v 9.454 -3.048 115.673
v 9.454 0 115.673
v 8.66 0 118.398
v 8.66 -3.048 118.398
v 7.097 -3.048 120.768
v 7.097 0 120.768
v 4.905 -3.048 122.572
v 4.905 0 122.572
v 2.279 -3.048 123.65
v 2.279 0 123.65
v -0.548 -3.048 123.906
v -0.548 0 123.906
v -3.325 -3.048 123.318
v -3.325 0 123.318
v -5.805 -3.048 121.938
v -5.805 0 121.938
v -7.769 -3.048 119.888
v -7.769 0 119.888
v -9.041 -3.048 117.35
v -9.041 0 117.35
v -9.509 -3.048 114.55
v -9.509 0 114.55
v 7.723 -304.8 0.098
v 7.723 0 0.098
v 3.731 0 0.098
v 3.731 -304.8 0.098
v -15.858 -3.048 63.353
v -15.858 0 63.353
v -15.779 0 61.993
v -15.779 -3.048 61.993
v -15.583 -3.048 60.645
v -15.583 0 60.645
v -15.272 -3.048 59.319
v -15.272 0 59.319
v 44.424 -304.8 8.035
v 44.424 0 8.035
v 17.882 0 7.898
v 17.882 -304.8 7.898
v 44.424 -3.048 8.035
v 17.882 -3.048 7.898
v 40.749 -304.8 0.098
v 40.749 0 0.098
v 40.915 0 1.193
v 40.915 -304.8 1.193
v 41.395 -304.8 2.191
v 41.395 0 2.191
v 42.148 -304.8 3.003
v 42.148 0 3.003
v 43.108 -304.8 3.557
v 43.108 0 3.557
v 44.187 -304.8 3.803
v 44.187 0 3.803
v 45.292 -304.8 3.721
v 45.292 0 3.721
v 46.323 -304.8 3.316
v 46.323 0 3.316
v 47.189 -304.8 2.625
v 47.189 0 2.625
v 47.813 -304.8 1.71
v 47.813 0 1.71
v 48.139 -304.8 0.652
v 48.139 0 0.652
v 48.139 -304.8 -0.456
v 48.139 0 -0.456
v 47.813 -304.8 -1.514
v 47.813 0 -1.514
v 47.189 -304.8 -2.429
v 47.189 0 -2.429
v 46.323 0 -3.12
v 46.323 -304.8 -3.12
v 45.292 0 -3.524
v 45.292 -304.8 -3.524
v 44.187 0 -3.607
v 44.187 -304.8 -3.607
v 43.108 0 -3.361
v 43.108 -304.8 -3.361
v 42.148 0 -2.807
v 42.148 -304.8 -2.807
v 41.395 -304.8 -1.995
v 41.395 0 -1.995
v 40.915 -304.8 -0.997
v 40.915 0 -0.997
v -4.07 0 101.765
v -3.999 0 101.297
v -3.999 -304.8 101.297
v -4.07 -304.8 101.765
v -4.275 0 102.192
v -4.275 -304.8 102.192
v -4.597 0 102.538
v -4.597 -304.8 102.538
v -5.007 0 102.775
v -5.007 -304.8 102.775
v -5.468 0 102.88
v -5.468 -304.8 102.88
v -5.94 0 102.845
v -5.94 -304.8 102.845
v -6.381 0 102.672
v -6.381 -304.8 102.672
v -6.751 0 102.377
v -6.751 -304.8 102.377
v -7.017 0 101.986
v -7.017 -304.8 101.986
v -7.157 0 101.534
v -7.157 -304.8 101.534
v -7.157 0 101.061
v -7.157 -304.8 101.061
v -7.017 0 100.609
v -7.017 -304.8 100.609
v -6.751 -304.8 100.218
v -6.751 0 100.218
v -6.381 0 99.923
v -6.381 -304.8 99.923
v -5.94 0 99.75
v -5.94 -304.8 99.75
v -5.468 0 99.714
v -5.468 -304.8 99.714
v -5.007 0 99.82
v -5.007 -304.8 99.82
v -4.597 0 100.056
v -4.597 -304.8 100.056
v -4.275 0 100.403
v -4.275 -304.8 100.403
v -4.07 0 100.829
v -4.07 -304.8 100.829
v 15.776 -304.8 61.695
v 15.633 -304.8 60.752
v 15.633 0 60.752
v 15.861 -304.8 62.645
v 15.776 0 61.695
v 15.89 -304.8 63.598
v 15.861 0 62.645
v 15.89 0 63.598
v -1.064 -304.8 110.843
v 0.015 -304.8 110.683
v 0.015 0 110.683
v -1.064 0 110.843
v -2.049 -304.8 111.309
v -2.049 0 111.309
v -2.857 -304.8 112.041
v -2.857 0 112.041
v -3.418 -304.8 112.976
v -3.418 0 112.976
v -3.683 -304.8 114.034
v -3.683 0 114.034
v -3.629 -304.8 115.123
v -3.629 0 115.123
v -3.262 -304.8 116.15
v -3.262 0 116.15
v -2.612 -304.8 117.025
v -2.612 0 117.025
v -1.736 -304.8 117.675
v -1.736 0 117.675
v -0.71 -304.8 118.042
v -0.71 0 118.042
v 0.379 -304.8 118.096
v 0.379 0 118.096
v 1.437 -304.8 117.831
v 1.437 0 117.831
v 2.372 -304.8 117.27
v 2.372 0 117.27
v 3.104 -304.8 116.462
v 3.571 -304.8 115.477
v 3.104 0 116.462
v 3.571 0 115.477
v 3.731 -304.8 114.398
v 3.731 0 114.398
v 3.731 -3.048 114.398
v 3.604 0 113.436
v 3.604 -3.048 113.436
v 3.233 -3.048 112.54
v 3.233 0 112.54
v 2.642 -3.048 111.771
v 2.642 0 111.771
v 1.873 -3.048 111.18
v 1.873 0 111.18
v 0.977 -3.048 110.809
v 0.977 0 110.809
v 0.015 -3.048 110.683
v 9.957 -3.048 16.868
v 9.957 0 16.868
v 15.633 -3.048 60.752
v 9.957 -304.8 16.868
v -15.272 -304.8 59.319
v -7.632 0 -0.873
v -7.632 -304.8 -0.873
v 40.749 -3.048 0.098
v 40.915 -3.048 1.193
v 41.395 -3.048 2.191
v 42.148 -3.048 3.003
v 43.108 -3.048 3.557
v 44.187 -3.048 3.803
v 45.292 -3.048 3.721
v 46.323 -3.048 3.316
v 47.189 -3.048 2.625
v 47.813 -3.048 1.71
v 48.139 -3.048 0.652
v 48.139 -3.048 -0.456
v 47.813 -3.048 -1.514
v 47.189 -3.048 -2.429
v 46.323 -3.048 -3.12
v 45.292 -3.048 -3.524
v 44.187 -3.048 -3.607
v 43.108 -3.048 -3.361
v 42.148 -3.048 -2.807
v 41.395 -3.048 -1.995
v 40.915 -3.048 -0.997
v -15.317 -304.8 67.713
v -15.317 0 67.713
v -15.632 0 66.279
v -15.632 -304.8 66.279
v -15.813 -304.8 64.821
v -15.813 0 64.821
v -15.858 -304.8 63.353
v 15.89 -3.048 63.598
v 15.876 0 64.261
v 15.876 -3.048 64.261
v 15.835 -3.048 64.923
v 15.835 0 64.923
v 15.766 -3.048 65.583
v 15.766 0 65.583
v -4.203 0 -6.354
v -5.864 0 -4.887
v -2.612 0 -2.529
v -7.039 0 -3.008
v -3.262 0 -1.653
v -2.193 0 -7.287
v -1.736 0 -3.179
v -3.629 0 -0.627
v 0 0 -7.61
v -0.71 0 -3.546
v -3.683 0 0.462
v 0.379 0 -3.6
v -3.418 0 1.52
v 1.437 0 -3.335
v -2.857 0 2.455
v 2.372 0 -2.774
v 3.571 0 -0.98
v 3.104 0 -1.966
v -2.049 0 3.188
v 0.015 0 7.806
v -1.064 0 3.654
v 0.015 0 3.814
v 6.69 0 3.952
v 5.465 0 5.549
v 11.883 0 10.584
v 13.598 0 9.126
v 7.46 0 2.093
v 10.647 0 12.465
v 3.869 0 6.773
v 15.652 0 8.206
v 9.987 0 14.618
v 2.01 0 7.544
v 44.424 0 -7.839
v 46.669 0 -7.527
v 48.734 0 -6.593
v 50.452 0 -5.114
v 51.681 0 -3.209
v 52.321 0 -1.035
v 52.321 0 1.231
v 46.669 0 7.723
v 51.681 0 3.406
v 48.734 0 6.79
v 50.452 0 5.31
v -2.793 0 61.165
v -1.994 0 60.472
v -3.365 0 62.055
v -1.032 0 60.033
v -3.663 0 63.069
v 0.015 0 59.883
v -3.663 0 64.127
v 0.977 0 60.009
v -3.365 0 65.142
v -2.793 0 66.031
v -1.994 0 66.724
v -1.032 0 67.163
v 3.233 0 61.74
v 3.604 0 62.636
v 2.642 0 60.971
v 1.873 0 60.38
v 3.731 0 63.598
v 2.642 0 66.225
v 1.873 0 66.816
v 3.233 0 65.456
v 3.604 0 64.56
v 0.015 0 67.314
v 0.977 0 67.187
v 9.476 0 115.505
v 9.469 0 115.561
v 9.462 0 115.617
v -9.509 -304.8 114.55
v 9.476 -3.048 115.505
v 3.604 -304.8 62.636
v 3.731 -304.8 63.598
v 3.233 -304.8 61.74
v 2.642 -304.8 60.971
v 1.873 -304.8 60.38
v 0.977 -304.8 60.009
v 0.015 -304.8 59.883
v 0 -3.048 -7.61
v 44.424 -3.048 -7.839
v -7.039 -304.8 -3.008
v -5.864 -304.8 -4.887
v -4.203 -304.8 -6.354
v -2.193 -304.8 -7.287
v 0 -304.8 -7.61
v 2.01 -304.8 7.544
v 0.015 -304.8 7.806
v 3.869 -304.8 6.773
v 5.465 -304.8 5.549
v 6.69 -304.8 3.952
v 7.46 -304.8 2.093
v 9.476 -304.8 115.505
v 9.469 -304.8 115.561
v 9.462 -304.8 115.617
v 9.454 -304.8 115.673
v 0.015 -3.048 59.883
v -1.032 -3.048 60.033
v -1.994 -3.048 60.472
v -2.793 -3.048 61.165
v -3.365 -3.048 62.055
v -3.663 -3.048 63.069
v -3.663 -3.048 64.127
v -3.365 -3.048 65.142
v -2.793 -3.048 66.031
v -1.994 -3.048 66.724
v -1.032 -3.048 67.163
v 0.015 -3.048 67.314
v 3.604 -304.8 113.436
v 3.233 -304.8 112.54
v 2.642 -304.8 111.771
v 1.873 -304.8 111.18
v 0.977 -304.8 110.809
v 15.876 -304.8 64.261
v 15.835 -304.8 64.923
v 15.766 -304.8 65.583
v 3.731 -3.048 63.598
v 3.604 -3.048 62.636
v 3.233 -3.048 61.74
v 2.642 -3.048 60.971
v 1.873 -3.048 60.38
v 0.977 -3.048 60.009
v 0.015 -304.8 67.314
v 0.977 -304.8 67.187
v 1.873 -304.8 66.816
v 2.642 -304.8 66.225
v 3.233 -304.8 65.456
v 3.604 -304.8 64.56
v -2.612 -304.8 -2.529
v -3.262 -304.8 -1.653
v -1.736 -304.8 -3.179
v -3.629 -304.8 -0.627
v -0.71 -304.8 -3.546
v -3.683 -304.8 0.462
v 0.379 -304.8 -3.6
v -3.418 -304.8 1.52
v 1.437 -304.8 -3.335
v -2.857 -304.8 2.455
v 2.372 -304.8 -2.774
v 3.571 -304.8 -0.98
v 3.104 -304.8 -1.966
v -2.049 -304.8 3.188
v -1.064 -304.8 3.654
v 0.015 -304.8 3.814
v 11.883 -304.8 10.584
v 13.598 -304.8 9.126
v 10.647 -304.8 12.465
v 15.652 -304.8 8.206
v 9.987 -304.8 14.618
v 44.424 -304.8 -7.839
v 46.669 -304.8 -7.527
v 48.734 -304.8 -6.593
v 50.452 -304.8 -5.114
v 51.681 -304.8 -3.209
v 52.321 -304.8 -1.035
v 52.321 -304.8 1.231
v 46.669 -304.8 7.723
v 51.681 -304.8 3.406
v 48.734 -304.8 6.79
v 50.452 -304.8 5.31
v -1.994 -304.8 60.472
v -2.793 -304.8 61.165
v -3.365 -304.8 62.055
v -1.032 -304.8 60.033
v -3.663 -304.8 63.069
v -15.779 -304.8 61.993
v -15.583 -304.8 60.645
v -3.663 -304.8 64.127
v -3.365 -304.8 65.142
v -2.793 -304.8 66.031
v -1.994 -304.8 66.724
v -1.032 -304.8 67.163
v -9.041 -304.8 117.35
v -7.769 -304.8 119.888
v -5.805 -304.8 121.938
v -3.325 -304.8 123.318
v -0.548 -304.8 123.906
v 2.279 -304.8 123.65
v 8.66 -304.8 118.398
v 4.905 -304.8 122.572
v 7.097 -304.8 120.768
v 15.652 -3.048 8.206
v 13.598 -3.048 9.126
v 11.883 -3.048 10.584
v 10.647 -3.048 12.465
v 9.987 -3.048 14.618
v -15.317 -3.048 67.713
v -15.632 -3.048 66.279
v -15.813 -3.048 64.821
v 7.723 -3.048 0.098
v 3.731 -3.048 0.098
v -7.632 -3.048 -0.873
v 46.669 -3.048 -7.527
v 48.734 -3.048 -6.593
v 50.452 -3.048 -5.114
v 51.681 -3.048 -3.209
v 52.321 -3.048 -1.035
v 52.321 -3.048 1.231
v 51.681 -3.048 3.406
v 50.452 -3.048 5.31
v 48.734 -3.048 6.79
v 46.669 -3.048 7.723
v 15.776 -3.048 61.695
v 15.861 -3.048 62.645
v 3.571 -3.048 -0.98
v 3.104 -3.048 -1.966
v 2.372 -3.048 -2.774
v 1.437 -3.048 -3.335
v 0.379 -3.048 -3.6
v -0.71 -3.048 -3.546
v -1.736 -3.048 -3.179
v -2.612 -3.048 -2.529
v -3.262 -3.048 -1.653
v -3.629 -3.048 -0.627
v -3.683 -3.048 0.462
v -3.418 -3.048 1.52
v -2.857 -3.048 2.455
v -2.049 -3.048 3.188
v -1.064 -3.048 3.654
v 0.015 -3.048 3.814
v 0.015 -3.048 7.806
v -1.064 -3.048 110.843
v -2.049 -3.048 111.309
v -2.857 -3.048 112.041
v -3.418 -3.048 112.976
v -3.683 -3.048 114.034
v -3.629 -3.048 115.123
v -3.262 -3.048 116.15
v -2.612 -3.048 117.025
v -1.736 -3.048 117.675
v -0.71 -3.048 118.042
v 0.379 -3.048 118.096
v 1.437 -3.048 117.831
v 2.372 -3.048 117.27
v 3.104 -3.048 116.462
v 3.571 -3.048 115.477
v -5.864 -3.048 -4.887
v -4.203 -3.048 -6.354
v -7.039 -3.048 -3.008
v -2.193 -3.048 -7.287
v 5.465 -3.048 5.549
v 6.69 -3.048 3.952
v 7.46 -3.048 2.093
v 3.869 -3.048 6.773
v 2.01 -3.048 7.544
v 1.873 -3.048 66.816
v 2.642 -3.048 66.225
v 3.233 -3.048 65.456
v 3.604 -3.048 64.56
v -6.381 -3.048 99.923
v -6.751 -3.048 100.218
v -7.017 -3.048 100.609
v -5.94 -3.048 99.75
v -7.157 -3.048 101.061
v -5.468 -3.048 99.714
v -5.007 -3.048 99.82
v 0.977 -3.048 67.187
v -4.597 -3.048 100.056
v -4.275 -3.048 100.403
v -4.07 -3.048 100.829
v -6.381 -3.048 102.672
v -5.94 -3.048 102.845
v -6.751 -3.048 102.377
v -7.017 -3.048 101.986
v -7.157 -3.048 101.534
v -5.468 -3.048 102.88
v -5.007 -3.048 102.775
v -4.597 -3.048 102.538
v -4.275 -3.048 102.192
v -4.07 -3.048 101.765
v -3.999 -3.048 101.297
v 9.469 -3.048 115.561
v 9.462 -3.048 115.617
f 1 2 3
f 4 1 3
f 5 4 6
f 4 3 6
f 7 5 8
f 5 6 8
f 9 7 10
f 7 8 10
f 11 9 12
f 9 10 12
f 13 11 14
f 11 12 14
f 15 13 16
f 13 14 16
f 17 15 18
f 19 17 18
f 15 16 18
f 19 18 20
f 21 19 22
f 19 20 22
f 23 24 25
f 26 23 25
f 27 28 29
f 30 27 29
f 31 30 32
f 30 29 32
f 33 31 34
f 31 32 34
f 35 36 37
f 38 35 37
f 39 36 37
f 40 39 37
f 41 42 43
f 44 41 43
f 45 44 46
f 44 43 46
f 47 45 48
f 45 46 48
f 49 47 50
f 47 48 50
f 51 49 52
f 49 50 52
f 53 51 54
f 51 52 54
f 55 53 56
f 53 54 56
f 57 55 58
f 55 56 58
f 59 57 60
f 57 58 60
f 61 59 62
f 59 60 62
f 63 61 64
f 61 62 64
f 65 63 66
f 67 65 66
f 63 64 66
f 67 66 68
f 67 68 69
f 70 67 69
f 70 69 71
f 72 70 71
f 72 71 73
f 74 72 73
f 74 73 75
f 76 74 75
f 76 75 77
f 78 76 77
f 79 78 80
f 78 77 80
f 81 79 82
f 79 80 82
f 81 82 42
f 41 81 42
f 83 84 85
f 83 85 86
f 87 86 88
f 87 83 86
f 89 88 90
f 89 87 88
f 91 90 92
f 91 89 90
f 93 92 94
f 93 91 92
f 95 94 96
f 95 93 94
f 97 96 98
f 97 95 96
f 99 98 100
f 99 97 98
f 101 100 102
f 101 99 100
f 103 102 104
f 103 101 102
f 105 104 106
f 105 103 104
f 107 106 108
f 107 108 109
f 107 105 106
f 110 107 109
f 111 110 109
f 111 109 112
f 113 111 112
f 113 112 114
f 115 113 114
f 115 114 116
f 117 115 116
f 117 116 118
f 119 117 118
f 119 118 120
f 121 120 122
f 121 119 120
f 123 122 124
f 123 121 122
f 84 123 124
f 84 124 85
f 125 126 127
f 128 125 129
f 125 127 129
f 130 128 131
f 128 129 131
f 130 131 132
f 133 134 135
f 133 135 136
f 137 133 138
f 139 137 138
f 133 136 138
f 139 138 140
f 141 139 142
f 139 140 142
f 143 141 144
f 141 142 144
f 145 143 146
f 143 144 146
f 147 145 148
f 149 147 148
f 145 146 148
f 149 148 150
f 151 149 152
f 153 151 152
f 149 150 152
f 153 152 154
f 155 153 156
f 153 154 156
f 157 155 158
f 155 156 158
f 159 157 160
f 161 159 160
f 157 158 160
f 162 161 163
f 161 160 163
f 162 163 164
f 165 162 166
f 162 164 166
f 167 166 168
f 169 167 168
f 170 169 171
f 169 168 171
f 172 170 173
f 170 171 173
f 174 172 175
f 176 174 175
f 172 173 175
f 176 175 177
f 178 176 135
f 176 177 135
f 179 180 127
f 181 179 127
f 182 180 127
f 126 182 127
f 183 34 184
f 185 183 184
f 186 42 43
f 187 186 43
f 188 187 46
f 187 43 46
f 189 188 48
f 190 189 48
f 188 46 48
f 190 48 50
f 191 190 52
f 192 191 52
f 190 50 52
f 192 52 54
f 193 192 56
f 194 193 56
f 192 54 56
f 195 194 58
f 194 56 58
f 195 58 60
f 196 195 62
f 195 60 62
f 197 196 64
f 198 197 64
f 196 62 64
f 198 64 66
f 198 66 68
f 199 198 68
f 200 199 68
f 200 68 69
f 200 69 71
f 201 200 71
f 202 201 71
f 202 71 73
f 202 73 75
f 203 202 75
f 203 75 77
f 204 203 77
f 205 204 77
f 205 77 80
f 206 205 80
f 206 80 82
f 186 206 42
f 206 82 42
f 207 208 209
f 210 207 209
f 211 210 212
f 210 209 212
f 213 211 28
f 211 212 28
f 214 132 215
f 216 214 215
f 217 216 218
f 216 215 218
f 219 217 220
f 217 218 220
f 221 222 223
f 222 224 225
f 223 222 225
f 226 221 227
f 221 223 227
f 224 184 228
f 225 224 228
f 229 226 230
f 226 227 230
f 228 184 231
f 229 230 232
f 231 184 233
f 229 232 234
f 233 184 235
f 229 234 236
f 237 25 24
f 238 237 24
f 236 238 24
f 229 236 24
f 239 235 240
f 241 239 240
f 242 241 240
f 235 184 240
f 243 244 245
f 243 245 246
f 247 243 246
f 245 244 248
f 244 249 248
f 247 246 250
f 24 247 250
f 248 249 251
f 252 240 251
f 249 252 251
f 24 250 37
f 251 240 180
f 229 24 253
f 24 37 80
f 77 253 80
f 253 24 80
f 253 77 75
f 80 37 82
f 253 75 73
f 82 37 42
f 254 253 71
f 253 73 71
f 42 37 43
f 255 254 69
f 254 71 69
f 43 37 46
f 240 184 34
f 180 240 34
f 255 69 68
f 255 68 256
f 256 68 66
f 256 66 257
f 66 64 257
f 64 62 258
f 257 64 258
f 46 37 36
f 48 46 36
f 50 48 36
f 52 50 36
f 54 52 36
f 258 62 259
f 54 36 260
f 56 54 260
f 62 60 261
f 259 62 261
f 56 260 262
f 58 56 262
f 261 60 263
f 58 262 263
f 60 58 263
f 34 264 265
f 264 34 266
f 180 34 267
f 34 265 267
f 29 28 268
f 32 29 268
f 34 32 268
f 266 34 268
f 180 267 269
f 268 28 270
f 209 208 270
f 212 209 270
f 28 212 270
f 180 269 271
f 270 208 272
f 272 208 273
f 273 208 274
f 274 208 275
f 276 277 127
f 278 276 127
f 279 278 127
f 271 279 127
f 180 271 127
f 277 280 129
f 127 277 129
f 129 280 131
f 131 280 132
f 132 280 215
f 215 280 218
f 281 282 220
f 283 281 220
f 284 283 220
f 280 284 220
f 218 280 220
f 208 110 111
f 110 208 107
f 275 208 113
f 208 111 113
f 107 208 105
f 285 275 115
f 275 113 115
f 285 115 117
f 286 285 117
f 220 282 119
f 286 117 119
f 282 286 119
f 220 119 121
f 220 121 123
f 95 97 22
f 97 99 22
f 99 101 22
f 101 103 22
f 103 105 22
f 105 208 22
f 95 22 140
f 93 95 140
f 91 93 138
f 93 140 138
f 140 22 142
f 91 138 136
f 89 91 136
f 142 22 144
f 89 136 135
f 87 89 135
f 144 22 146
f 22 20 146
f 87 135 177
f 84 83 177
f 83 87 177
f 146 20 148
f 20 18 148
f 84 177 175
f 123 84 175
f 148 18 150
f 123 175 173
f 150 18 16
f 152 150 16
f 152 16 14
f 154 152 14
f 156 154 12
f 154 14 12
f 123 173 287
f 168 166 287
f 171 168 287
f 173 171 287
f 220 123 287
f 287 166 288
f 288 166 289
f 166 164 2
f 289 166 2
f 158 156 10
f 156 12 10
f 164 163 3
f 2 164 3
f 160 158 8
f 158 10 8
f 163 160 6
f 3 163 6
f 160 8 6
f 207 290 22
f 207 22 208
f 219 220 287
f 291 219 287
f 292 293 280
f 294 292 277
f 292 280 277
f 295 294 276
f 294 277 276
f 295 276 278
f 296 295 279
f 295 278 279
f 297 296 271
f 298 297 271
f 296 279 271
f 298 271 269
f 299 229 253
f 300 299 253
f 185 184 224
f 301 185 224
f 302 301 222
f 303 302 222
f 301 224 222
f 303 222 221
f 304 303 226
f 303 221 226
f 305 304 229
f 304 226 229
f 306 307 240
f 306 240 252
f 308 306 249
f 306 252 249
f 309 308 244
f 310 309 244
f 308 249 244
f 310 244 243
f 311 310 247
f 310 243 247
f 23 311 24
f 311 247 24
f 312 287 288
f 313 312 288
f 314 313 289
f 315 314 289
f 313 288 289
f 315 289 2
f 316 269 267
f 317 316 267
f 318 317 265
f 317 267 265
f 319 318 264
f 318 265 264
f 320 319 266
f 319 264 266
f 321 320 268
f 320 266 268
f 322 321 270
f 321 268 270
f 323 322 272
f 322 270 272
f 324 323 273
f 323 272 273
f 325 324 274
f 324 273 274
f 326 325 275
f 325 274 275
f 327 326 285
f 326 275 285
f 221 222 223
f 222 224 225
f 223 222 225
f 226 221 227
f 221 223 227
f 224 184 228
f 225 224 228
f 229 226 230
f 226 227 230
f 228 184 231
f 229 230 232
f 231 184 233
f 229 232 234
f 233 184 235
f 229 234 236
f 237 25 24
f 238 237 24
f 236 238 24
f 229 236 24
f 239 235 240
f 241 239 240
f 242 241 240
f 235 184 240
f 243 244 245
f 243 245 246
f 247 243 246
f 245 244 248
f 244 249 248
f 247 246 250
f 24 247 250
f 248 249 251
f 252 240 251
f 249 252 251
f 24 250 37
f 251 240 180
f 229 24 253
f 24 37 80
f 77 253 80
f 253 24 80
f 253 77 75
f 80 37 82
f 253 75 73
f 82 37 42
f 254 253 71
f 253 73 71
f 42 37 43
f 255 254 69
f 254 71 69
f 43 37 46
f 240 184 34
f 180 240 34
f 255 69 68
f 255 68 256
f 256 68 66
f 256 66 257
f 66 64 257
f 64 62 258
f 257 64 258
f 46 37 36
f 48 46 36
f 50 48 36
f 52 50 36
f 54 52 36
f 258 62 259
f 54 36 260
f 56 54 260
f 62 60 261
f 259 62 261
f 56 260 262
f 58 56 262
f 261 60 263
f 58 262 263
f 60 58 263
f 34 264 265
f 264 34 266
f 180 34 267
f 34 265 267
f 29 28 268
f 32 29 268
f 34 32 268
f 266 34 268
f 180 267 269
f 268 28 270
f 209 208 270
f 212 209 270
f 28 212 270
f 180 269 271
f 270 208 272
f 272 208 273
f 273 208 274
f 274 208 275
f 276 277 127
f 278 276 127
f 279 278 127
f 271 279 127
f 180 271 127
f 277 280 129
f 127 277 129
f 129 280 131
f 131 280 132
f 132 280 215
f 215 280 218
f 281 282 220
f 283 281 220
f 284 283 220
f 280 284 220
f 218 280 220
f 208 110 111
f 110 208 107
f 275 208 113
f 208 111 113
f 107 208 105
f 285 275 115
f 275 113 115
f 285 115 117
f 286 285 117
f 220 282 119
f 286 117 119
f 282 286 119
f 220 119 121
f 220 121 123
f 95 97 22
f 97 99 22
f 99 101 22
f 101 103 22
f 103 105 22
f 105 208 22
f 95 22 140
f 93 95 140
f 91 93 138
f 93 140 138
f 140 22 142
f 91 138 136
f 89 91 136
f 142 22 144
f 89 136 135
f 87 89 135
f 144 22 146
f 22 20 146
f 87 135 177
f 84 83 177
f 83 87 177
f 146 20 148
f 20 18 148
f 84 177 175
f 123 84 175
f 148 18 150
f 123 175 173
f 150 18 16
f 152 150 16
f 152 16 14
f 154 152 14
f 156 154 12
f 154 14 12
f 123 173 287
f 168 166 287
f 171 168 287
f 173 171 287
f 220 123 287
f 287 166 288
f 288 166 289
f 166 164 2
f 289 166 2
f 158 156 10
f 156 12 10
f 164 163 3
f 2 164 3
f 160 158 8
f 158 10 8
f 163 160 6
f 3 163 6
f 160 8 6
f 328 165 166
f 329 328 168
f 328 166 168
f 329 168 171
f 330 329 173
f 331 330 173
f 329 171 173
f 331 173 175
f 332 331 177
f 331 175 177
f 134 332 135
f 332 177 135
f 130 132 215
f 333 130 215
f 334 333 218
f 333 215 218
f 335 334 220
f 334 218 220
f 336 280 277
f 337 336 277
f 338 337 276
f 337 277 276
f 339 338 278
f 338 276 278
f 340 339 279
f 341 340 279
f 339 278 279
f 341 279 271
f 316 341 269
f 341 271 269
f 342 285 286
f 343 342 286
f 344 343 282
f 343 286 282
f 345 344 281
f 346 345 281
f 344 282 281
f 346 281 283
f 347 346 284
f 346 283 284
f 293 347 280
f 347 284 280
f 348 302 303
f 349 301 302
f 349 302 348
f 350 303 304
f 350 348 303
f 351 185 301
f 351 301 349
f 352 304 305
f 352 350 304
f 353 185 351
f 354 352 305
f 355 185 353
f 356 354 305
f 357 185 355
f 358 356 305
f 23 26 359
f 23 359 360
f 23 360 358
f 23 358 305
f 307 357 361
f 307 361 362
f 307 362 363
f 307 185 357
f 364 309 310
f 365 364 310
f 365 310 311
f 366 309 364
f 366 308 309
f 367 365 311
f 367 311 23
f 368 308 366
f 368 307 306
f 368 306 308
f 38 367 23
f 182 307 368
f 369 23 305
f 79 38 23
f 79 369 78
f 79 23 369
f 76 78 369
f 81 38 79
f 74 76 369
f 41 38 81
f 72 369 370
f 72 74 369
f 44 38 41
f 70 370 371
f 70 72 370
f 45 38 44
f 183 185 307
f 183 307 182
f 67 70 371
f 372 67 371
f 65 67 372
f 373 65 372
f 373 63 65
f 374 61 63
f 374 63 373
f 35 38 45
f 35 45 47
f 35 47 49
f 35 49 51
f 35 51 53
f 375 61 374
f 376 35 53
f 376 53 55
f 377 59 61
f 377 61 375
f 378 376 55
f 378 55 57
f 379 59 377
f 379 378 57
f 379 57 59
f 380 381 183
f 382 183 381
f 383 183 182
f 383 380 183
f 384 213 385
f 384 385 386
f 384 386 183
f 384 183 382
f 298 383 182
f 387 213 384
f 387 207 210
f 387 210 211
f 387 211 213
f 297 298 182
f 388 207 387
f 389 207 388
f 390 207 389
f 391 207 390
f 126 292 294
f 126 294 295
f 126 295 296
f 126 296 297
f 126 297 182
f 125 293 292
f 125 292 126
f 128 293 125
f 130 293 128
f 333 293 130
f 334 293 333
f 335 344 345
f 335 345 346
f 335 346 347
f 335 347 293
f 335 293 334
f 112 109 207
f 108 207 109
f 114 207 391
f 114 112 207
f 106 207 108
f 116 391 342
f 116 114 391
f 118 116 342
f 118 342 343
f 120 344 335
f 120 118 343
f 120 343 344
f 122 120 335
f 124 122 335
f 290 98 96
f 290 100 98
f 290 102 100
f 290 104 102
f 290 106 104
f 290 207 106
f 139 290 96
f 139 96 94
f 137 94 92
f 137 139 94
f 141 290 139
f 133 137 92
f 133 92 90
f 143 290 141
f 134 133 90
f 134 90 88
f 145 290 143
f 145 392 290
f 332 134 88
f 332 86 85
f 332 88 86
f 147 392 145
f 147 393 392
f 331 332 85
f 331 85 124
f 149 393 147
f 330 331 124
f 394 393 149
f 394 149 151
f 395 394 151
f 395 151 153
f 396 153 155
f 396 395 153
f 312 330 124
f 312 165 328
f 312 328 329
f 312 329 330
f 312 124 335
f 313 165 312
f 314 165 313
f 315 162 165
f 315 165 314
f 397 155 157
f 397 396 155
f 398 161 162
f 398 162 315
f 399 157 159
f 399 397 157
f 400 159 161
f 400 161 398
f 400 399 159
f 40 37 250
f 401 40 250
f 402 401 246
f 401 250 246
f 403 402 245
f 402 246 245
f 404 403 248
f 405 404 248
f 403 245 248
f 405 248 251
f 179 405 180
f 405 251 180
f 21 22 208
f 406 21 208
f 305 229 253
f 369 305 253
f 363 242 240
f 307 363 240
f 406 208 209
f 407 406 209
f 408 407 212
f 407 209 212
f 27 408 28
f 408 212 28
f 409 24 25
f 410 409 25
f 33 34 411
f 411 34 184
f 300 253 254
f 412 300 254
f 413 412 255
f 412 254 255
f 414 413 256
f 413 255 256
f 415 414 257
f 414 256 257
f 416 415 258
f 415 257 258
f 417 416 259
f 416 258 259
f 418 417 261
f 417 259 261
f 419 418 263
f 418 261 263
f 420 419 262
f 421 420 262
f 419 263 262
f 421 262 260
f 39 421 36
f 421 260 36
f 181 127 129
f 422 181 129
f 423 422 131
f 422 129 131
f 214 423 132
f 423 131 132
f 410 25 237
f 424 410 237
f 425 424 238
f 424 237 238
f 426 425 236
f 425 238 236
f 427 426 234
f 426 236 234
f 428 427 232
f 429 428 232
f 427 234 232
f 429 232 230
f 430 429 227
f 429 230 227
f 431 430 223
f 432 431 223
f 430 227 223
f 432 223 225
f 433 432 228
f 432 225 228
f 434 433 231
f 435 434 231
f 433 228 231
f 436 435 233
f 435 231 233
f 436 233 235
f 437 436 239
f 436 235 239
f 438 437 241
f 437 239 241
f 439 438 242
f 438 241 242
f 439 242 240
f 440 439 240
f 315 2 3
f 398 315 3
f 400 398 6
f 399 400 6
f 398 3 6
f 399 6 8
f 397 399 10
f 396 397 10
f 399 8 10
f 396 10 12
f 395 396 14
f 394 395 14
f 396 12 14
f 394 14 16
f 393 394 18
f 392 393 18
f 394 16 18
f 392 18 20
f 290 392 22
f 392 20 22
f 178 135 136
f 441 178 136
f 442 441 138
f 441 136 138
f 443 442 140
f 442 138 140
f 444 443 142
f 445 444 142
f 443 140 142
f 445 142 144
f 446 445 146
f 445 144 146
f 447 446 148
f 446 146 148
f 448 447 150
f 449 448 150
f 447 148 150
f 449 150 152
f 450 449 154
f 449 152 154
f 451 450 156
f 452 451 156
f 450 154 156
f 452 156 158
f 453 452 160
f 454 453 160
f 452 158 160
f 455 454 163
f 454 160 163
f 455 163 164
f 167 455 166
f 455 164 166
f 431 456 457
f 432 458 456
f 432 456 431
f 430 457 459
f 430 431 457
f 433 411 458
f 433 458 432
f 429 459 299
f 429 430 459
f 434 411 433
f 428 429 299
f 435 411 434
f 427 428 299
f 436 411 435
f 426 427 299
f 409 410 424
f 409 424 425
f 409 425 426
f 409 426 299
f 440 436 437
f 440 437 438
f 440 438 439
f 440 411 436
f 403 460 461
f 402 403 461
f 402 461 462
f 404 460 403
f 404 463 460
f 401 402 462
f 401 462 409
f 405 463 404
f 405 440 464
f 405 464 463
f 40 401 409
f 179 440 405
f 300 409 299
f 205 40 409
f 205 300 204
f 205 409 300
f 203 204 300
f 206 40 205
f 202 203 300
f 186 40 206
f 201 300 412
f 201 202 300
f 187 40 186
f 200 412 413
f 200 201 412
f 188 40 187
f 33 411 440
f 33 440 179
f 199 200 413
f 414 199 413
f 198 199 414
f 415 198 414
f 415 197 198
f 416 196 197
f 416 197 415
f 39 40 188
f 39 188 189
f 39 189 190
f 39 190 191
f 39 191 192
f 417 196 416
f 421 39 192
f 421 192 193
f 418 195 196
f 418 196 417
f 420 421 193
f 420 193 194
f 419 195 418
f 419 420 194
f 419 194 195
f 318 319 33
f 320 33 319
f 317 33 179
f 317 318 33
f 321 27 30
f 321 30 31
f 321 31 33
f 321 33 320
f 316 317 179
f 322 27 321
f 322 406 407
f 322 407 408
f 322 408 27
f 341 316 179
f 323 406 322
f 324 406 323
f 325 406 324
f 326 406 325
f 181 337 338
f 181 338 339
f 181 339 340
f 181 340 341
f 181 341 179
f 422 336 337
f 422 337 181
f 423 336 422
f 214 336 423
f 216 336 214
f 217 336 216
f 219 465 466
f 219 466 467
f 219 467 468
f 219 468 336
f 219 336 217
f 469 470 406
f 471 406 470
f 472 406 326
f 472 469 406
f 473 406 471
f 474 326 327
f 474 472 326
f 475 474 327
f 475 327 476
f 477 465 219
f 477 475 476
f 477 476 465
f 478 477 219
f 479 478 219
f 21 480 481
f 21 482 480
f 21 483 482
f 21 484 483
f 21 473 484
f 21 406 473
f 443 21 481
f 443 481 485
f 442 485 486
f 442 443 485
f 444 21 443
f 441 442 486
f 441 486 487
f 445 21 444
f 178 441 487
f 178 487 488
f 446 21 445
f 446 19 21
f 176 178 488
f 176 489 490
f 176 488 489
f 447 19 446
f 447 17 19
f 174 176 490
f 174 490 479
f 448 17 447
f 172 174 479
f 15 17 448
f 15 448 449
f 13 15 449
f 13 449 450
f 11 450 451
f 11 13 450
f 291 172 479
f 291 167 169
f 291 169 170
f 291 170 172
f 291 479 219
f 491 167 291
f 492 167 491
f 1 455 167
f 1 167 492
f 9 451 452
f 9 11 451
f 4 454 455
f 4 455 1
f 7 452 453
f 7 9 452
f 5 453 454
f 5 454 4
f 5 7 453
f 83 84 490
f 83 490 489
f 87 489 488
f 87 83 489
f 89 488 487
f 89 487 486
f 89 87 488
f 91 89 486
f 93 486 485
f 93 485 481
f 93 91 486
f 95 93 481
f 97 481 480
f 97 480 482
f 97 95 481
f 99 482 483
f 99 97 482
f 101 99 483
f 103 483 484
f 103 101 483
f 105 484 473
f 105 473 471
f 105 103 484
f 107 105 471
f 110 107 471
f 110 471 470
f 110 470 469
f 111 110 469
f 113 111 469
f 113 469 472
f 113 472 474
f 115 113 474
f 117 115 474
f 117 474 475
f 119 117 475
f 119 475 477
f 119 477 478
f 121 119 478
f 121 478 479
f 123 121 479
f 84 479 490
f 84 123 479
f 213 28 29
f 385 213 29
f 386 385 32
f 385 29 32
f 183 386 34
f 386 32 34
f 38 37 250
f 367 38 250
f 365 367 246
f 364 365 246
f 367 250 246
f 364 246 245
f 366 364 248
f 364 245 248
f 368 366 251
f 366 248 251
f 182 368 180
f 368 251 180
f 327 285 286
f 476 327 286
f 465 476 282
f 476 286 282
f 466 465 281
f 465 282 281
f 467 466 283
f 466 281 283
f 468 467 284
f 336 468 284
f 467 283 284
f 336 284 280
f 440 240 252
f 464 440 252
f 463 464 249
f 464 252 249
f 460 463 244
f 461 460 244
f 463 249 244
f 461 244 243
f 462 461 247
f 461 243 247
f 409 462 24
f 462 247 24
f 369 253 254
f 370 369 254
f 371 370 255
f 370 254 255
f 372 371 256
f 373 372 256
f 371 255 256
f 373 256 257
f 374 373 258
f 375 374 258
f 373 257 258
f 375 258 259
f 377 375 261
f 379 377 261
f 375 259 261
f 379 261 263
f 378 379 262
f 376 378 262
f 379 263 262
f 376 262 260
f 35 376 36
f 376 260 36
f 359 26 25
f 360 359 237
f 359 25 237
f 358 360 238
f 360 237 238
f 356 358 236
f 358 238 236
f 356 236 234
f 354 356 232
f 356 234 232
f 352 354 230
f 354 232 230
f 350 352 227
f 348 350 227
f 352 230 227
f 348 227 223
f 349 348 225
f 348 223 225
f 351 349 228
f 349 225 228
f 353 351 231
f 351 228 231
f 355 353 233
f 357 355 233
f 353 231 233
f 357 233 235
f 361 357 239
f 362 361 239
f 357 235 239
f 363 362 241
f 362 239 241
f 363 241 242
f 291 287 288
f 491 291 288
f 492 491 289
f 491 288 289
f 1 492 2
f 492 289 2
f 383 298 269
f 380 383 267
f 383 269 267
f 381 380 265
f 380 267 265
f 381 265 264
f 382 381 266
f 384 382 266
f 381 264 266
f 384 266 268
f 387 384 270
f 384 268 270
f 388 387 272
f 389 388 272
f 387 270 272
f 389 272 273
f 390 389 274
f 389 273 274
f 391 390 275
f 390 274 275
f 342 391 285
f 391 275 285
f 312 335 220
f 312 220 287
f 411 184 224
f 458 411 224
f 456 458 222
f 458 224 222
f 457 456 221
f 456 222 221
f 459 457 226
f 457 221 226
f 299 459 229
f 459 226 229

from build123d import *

# Parameters (mm, degrees)
F0_R     = 1.5875
F1_DEPTH = 304.8
F2_DEPTH = 3.048


with BuildPart() as f1:
    # F0 (on Front) → F1 (new body)
    with BuildSketch(Plane.XZ):
        with BuildLine():
            ThreePointArc((-9.5087361881, 114.5500842279), (-6.7736614446, 107.7168608946), (0.0150512367, 104.873103678))
            ThreePointArc((0.0150512367, 104.873103678), (6.7502433275, 107.6629115872), (9.5400512367, 114.398103678))
            ThreePointArc((9.5400512367, 114.398103678), (9.5239073745, 114.9524320558), (9.4755305122, 115.5048813783))
            Line((9.4755305122, 115.5048813783), (9.4543958033, 115.6726228626))
            ThreePointArc((9.4543958033, 115.6726228626), (-0.5478038918, 123.906458904), (-9.5087361881, 114.5500842279))
        make_face()
        with BuildLine():
            ThreePointArc((3.7306455777, 114.398103678), (2.6423731913, 111.7707817234), (0.0150512367, 110.682509337))
            ThreePointArc((0.0150512367, 110.682509337), (-2.612270718, 117.0254256327), (3.7306455777, 114.398103678))
        make_face(mode=Mode.SUBTRACT)
        with BuildLine():
            ThreePointArc((9.5400512367, 114.398103678), (6.7502433275, 107.6629115872), (0.0150512367, 104.873103678))
            Line((0.0150512367, 104.873103678), (0.0150512367, 79.473103678))
            ThreePointArc((0.0150512367, 79.473103678), (10.515332529, 75.5043926793), (15.7655247688, 65.5825956822))
            Line((15.7655247688, 65.5825956822), (9.4755305122, 115.5048813783))
            ThreePointArc((9.4755305122, 115.5048813783), (9.5239073745, 114.9524320558), (9.5400512367, 114.398103678))
        make_face()
        with BuildLine():
            Line((0.0150512367, 79.473103678), (0.0150512367, 104.873103678))
            ThreePointArc((0.0150512367, 104.873103678), (-6.7736614446, 107.7168608946), (-9.5087361881, 114.5500842279))
            Line((-9.5087361881, 114.5500842279), (-15.3173007855, 67.7132715322))
            ThreePointArc((-15.3173007855, 67.7132715322), (-9.6464014314, 76.1946094373), (0.0150512367, 79.473103678))
        make_face()
        with Locations((-5.5867941119, 101.2973338366)):
            Circle(F0_R, mode=Mode.SUBTRACT)
        with BuildLine():
            ThreePointArc((15.7655247688, 65.5825956822), (10.515332529, 75.5043926793), (0.0150512367, 79.473103678))
            Line((0.0150512367, 79.473103678), (0.0150512367, 67.313698019))
            ThreePointArc((0.0150512367, 67.313698019), (2.6423731913, 66.2254256327), (3.7306455777, 63.598103678))
            ThreePointArc((3.7306455777, 63.598103678), (2.6423731913, 60.9707817234), (0.0150512367, 59.882509337))
            Line((0.0150512367, 59.882509337), (0.0150512367, 47.723103678))
            ThreePointArc((0.0150512367, 47.723103678), (10.1844966564, 51.4080255464), (15.6328571229, 60.7520951923))
            ThreePointArc((15.6328571229, 60.7520951923), (15.8256219639, 62.1693005851), (15.8900512367, 63.598103678))
            ThreePointArc((15.8900512367, 63.598103678), (15.8588890344, 64.5923012635), (15.7655247688, 65.5825956822))
        make_face()
        with BuildLine():
            Line((0.0150512367, 67.313698019), (0.0150512367, 79.473103678))
            ThreePointArc((0.0150512367, 79.473103678), (-9.6464014314, 76.1946094373), (-15.3173007855, 67.7132715322))
            Line((-15.3173007855, 67.7132715322), (-15.8580556591, 63.3529456192))
            ThreePointArc((-15.8580556591, 63.3529456192), (-15.6952207307, 61.3170995766), (-15.2723604957, 59.3190071001))
            ThreePointArc((-15.2723604957, 59.3190071001), (-9.5788261553, 50.9500547539), (0.0150512367, 47.723103678))
            Line((0.0150512367, 47.723103678), (0.0150512367, 59.882509337))
            ThreePointArc((0.0150512367, 59.882509337), (-3.7005431043, 63.598103678), (0.0150512367, 67.313698019))
        make_face()
        with BuildLine():
            Line((-15.8580556591, 63.3529456192), (-15.3173007855, 67.7132715322))
            ThreePointArc((-15.3173007855, 67.7132715322), (-15.7392585574, 65.5519071258), (-15.8580556591, 63.3529456192))
        make_face()
        with BuildLine():
            ThreePointArc((9.4755305122, 115.5048813783), (9.4653353392, 115.5887990138), (9.4543958033, 115.6726228626))
            Line((9.4543958033, 115.6726228626), (9.4755305122, 115.5048813783))
        make_face()
        with BuildLine():
            ThreePointArc((15.6328571229, 60.7520951923), (10.1844966564, 51.4080255464), (0.0150512367, 47.723103678))
            Line((0.0150512367, 47.723103678), (0.0150512367, 7.8061611912))
            ThreePointArc((0.0150512367, 7.8061611912), (5.465470974, 5.5485234153), (7.7231087498, 0.098103678))
            Line((7.7231087498, 0.098103678), (36.5275512367, 0.098103678))
            ThreePointArc((36.5275512367, 0.098103678), (38.8379175893, 5.6962527618), (44.4240610104, 8.035497838))
            Line((44.4240610104, 8.035497838), (17.8821128526, 7.8984301254))
            ThreePointArc((17.8821128526, 7.8984301254), (11.8832927191, 10.5844264427), (9.9565419968, 16.8683782937))
            Line((9.9565419968, 16.8683782937), (15.6328571229, 60.7520951923))
        make_face()
        with BuildLine():
            Line((0.0150512367, 7.8061611912), (0.0150512367, 47.723103678))
            ThreePointArc((0.0150512367, 47.723103678), (-9.5788261553, 50.9500547539), (-15.2723604957, 59.3190071001))
            Line((-15.2723604957, 59.3190071001), (-7.6316439952, -0.8725675623))
            ThreePointArc((-7.6316439952, -0.8725675623), (-5.7683794222, 5.1937960196), (0.0150512367, 7.8061611912))
        make_face()
        with BuildLine():
            Line((0.0150512367, 3.813698019), (0.0150512367, 7.8061611912))
            ThreePointArc((0.0150512367, 7.8061611912), (-5.7683794222, 5.1937960196), (-7.6316439952, -0.8725675623))
            ThreePointArc((-7.6316439952, -0.8725675623), (-5.0862852236, -5.6803491378), (0, -7.6099391401))
            ThreePointArc((0, -7.6099391401), (5.460146958, -5.3576348799), (7.7231087498, 0.098103678))
            Line((7.7231087498, 0.098103678), (3.7306455777, 0.098103678))
            ThreePointArc((3.7306455777, 0.098103678), (-2.612270718, -2.5292182766), (0.0150512367, 3.813698019))
        make_face()
        with BuildLine():
            Line((36.5275512367, 0.098103678), (7.7231087498, 0.098103678))
            ThreePointArc((7.7231087498, 0.098103678), (5.460146958, -5.3576348799), (0, -7.6099391401))
            Line((0, -7.6099391401), (44.4240722723, -7.8392905401))
            ThreePointArc((44.4240722723, -7.8392905401), (38.8379215607, -5.5000493978), (36.5275512367, 0.098103678))
        make_face()
        with BuildLine():
            ThreePointArc((44.4240610104, 8.035497838), (38.8379175893, 5.6962527618), (36.5275512367, 0.098103678))
            ThreePointArc((36.5275512367, 0.098103678), (38.8379215607, -5.5000493978), (44.4240722723, -7.8392905401))
            ThreePointArc((44.4240722723, -7.8392905401), (50.0632043125, -5.5290259979), (52.4025512367, 0.098103678))
            ThreePointArc((52.4025512367, 0.098103678), (50.0632003205, 5.7252373254), (44.4240610104, 8.035497838))
        make_face()
        with BuildLine():
            ThreePointArc((48.1806455777, 0.098103678), (44.4650512367, -3.617490663), (40.7494568957, 0.098103678))
            ThreePointArc((40.7494568957, 0.098103678), (44.4650512367, 3.813698019), (48.1806455777, 0.098103678))
        make_face(mode=Mode.SUBTRACT)
    extrude(amount=F1_DEPTH)


with BuildPart() as f2:
    # F0 (on Front) → F2 (new body)
    with BuildSketch(Plane.XZ):
        with BuildLine():
            ThreePointArc((-9.5087361881, 114.5500842279), (-6.7736614446, 107.7168608946), (0.0150512367, 104.873103678))
            ThreePointArc((0.0150512367, 104.873103678), (6.7502433275, 107.6629115872), (9.5400512367, 114.398103678))
            ThreePointArc((9.5400512367, 114.398103678), (9.5239073745, 114.9524320558), (9.4755305122, 115.5048813783))
            Line((9.4755305122, 115.5048813783), (9.4543958033, 115.6726228626))
            ThreePointArc((9.4543958033, 115.6726228626), (-0.5478038918, 123.906458904), (-9.5087361881, 114.5500842279))
        make_face()
        with BuildLine():
            ThreePointArc((3.7306455777, 114.398103678), (2.6423731913, 111.7707817234), (0.0150512367, 110.682509337))
            ThreePointArc((0.0150512367, 110.682509337), (-2.612270718, 117.0254256327), (3.7306455777, 114.398103678))
        make_face(mode=Mode.SUBTRACT)
        with BuildLine():
            ThreePointArc((9.5400512367, 114.398103678), (6.7502433275, 107.6629115872), (0.0150512367, 104.873103678))
            Line((0.0150512367, 104.873103678), (0.0150512367, 79.473103678))
            ThreePointArc((0.0150512367, 79.473103678), (10.515332529, 75.5043926793), (15.7655247688, 65.5825956822))
            Line((15.7655247688, 65.5825956822), (9.4755305122, 115.5048813783))
            ThreePointArc((9.4755305122, 115.5048813783), (9.5239073745, 114.9524320558), (9.5400512367, 114.398103678))
        make_face()
        with BuildLine():
            Line((0.0150512367, 79.473103678), (0.0150512367, 104.873103678))
            ThreePointArc((0.0150512367, 104.873103678), (-6.7736614446, 107.7168608946), (-9.5087361881, 114.5500842279))
            Line((-9.5087361881, 114.5500842279), (-15.3173007855, 67.7132715322))
            ThreePointArc((-15.3173007855, 67.7132715322), (-9.6464014314, 76.1946094373), (0.0150512367, 79.473103678))
        make_face()
        with Locations((-5.5867941119, 101.2973338366)):
            Circle(F0_R, mode=Mode.SUBTRACT)
        with BuildLine():
            ThreePointArc((15.7655247688, 65.5825956822), (10.515332529, 75.5043926793), (0.0150512367, 79.473103678))
            Line((0.0150512367, 79.473103678), (0.0150512367, 67.313698019))
            ThreePointArc((0.0150512367, 67.313698019), (2.6423731913, 66.2254256327), (3.7306455777, 63.598103678))
            ThreePointArc((3.7306455777, 63.598103678), (2.6423731913, 60.9707817234), (0.0150512367, 59.882509337))
            Line((0.0150512367, 59.882509337), (0.0150512367, 47.723103678))
            ThreePointArc((0.0150512367, 47.723103678), (10.1844966564, 51.4080255464), (15.6328571229, 60.7520951923))
            ThreePointArc((15.6328571229, 60.7520951923), (15.8256219639, 62.1693005851), (15.8900512367, 63.598103678))
            ThreePointArc((15.8900512367, 63.598103678), (15.8588890344, 64.5923012635), (15.7655247688, 65.5825956822))
        make_face()
        with BuildLine():
            Line((0.0150512367, 67.313698019), (0.0150512367, 79.473103678))
            ThreePointArc((0.0150512367, 79.473103678), (-9.6464014314, 76.1946094373), (-15.3173007855, 67.7132715322))
            Line((-15.3173007855, 67.7132715322), (-15.8580556591, 63.3529456192))
            ThreePointArc((-15.8580556591, 63.3529456192), (-15.6952207307, 61.3170995766), (-15.2723604957, 59.3190071001))
            ThreePointArc((-15.2723604957, 59.3190071001), (-9.5788261553, 50.9500547539), (0.0150512367, 47.723103678))
            Line((0.0150512367, 47.723103678), (0.0150512367, 59.882509337))
            ThreePointArc((0.0150512367, 59.882509337), (-3.7005431043, 63.598103678), (0.0150512367, 67.313698019))
        make_face()
        with BuildLine():
            Line((-15.8580556591, 63.3529456192), (-15.3173007855, 67.7132715322))
            ThreePointArc((-15.3173007855, 67.7132715322), (-15.7392585574, 65.5519071258), (-15.8580556591, 63.3529456192))
        make_face()
        with BuildLine():
            ThreePointArc((9.4755305122, 115.5048813783), (9.4653353392, 115.5887990138), (9.4543958033, 115.6726228626))
            Line((9.4543958033, 115.6726228626), (9.4755305122, 115.5048813783))
        make_face()
        with BuildLine():
            ThreePointArc((15.6328571229, 60.7520951923), (10.1844966564, 51.4080255464), (0.0150512367, 47.723103678))
            Line((0.0150512367, 47.723103678), (0.0150512367, 7.8061611912))
            ThreePointArc((0.0150512367, 7.8061611912), (5.465470974, 5.5485234153), (7.7231087498, 0.098103678))
            Line((7.7231087498, 0.098103678), (36.5275512367, 0.098103678))
            ThreePointArc((36.5275512367, 0.098103678), (38.8379175893, 5.6962527618), (44.4240610104, 8.035497838))
            Line((44.4240610104, 8.035497838), (17.8821128526, 7.8984301254))
            ThreePointArc((17.8821128526, 7.8984301254), (11.8832927191, 10.5844264427), (9.9565419968, 16.8683782937))
            Line((9.9565419968, 16.8683782937), (15.6328571229, 60.7520951923))
        make_face()
        with BuildLine():
            Line((0.0150512367, 7.8061611912), (0.0150512367, 47.723103678))
            ThreePointArc((0.0150512367, 47.723103678), (-9.5788261553, 50.9500547539), (-15.2723604957, 59.3190071001))
            Line((-15.2723604957, 59.3190071001), (-7.6316439952, -0.8725675623))
            ThreePointArc((-7.6316439952, -0.8725675623), (-5.7683794222, 5.1937960196), (0.0150512367, 7.8061611912))
        make_face()
        with BuildLine():
            Line((0.0150512367, 3.813698019), (0.0150512367, 7.8061611912))
            ThreePointArc((0.0150512367, 7.8061611912), (-5.7683794222, 5.1937960196), (-7.6316439952, -0.8725675623))
            ThreePointArc((-7.6316439952, -0.8725675623), (-5.0862852236, -5.6803491378), (0, -7.6099391401))
            ThreePointArc((0, -7.6099391401), (5.460146958, -5.3576348799), (7.7231087498, 0.098103678))
            Line((7.7231087498, 0.098103678), (3.7306455777, 0.098103678))
            ThreePointArc((3.7306455777, 0.098103678), (-2.612270718, -2.5292182766), (0.0150512367, 3.813698019))
        make_face()
        with BuildLine():
            Line((36.5275512367, 0.098103678), (7.7231087498, 0.098103678))
            ThreePointArc((7.7231087498, 0.098103678), (5.460146958, -5.3576348799), (0, -7.6099391401))
            Line((0, -7.6099391401), (44.4240722723, -7.8392905401))
            ThreePointArc((44.4240722723, -7.8392905401), (38.8379215607, -5.5000493978), (36.5275512367, 0.098103678))
        make_face()
        with BuildLine():
            ThreePointArc((44.4240610104, 8.035497838), (38.8379175893, 5.6962527618), (36.5275512367, 0.098103678))
            ThreePointArc((36.5275512367, 0.098103678), (38.8379215607, -5.5000493978), (44.4240722723, -7.8392905401))
            ThreePointArc((44.4240722723, -7.8392905401), (50.0632043125, -5.5290259979), (52.4025512367, 0.098103678))
            ThreePointArc((52.4025512367, 0.098103678), (50.0632003205, 5.7252373254), (44.4240610104, 8.035497838))
        make_face()
        with BuildLine():
            ThreePointArc((48.1806455777, 0.098103678), (44.4650512367, -3.617490663), (40.7494568957, 0.098103678))
            ThreePointArc((40.7494568957, 0.098103678), (44.4650512367, 3.813698019), (48.1806455777, 0.098103678))
        make_face(mode=Mode.SUBTRACT)
    extrude(amount=F2_DEPTH)


solid = Compound([f1.part, f2.part])
